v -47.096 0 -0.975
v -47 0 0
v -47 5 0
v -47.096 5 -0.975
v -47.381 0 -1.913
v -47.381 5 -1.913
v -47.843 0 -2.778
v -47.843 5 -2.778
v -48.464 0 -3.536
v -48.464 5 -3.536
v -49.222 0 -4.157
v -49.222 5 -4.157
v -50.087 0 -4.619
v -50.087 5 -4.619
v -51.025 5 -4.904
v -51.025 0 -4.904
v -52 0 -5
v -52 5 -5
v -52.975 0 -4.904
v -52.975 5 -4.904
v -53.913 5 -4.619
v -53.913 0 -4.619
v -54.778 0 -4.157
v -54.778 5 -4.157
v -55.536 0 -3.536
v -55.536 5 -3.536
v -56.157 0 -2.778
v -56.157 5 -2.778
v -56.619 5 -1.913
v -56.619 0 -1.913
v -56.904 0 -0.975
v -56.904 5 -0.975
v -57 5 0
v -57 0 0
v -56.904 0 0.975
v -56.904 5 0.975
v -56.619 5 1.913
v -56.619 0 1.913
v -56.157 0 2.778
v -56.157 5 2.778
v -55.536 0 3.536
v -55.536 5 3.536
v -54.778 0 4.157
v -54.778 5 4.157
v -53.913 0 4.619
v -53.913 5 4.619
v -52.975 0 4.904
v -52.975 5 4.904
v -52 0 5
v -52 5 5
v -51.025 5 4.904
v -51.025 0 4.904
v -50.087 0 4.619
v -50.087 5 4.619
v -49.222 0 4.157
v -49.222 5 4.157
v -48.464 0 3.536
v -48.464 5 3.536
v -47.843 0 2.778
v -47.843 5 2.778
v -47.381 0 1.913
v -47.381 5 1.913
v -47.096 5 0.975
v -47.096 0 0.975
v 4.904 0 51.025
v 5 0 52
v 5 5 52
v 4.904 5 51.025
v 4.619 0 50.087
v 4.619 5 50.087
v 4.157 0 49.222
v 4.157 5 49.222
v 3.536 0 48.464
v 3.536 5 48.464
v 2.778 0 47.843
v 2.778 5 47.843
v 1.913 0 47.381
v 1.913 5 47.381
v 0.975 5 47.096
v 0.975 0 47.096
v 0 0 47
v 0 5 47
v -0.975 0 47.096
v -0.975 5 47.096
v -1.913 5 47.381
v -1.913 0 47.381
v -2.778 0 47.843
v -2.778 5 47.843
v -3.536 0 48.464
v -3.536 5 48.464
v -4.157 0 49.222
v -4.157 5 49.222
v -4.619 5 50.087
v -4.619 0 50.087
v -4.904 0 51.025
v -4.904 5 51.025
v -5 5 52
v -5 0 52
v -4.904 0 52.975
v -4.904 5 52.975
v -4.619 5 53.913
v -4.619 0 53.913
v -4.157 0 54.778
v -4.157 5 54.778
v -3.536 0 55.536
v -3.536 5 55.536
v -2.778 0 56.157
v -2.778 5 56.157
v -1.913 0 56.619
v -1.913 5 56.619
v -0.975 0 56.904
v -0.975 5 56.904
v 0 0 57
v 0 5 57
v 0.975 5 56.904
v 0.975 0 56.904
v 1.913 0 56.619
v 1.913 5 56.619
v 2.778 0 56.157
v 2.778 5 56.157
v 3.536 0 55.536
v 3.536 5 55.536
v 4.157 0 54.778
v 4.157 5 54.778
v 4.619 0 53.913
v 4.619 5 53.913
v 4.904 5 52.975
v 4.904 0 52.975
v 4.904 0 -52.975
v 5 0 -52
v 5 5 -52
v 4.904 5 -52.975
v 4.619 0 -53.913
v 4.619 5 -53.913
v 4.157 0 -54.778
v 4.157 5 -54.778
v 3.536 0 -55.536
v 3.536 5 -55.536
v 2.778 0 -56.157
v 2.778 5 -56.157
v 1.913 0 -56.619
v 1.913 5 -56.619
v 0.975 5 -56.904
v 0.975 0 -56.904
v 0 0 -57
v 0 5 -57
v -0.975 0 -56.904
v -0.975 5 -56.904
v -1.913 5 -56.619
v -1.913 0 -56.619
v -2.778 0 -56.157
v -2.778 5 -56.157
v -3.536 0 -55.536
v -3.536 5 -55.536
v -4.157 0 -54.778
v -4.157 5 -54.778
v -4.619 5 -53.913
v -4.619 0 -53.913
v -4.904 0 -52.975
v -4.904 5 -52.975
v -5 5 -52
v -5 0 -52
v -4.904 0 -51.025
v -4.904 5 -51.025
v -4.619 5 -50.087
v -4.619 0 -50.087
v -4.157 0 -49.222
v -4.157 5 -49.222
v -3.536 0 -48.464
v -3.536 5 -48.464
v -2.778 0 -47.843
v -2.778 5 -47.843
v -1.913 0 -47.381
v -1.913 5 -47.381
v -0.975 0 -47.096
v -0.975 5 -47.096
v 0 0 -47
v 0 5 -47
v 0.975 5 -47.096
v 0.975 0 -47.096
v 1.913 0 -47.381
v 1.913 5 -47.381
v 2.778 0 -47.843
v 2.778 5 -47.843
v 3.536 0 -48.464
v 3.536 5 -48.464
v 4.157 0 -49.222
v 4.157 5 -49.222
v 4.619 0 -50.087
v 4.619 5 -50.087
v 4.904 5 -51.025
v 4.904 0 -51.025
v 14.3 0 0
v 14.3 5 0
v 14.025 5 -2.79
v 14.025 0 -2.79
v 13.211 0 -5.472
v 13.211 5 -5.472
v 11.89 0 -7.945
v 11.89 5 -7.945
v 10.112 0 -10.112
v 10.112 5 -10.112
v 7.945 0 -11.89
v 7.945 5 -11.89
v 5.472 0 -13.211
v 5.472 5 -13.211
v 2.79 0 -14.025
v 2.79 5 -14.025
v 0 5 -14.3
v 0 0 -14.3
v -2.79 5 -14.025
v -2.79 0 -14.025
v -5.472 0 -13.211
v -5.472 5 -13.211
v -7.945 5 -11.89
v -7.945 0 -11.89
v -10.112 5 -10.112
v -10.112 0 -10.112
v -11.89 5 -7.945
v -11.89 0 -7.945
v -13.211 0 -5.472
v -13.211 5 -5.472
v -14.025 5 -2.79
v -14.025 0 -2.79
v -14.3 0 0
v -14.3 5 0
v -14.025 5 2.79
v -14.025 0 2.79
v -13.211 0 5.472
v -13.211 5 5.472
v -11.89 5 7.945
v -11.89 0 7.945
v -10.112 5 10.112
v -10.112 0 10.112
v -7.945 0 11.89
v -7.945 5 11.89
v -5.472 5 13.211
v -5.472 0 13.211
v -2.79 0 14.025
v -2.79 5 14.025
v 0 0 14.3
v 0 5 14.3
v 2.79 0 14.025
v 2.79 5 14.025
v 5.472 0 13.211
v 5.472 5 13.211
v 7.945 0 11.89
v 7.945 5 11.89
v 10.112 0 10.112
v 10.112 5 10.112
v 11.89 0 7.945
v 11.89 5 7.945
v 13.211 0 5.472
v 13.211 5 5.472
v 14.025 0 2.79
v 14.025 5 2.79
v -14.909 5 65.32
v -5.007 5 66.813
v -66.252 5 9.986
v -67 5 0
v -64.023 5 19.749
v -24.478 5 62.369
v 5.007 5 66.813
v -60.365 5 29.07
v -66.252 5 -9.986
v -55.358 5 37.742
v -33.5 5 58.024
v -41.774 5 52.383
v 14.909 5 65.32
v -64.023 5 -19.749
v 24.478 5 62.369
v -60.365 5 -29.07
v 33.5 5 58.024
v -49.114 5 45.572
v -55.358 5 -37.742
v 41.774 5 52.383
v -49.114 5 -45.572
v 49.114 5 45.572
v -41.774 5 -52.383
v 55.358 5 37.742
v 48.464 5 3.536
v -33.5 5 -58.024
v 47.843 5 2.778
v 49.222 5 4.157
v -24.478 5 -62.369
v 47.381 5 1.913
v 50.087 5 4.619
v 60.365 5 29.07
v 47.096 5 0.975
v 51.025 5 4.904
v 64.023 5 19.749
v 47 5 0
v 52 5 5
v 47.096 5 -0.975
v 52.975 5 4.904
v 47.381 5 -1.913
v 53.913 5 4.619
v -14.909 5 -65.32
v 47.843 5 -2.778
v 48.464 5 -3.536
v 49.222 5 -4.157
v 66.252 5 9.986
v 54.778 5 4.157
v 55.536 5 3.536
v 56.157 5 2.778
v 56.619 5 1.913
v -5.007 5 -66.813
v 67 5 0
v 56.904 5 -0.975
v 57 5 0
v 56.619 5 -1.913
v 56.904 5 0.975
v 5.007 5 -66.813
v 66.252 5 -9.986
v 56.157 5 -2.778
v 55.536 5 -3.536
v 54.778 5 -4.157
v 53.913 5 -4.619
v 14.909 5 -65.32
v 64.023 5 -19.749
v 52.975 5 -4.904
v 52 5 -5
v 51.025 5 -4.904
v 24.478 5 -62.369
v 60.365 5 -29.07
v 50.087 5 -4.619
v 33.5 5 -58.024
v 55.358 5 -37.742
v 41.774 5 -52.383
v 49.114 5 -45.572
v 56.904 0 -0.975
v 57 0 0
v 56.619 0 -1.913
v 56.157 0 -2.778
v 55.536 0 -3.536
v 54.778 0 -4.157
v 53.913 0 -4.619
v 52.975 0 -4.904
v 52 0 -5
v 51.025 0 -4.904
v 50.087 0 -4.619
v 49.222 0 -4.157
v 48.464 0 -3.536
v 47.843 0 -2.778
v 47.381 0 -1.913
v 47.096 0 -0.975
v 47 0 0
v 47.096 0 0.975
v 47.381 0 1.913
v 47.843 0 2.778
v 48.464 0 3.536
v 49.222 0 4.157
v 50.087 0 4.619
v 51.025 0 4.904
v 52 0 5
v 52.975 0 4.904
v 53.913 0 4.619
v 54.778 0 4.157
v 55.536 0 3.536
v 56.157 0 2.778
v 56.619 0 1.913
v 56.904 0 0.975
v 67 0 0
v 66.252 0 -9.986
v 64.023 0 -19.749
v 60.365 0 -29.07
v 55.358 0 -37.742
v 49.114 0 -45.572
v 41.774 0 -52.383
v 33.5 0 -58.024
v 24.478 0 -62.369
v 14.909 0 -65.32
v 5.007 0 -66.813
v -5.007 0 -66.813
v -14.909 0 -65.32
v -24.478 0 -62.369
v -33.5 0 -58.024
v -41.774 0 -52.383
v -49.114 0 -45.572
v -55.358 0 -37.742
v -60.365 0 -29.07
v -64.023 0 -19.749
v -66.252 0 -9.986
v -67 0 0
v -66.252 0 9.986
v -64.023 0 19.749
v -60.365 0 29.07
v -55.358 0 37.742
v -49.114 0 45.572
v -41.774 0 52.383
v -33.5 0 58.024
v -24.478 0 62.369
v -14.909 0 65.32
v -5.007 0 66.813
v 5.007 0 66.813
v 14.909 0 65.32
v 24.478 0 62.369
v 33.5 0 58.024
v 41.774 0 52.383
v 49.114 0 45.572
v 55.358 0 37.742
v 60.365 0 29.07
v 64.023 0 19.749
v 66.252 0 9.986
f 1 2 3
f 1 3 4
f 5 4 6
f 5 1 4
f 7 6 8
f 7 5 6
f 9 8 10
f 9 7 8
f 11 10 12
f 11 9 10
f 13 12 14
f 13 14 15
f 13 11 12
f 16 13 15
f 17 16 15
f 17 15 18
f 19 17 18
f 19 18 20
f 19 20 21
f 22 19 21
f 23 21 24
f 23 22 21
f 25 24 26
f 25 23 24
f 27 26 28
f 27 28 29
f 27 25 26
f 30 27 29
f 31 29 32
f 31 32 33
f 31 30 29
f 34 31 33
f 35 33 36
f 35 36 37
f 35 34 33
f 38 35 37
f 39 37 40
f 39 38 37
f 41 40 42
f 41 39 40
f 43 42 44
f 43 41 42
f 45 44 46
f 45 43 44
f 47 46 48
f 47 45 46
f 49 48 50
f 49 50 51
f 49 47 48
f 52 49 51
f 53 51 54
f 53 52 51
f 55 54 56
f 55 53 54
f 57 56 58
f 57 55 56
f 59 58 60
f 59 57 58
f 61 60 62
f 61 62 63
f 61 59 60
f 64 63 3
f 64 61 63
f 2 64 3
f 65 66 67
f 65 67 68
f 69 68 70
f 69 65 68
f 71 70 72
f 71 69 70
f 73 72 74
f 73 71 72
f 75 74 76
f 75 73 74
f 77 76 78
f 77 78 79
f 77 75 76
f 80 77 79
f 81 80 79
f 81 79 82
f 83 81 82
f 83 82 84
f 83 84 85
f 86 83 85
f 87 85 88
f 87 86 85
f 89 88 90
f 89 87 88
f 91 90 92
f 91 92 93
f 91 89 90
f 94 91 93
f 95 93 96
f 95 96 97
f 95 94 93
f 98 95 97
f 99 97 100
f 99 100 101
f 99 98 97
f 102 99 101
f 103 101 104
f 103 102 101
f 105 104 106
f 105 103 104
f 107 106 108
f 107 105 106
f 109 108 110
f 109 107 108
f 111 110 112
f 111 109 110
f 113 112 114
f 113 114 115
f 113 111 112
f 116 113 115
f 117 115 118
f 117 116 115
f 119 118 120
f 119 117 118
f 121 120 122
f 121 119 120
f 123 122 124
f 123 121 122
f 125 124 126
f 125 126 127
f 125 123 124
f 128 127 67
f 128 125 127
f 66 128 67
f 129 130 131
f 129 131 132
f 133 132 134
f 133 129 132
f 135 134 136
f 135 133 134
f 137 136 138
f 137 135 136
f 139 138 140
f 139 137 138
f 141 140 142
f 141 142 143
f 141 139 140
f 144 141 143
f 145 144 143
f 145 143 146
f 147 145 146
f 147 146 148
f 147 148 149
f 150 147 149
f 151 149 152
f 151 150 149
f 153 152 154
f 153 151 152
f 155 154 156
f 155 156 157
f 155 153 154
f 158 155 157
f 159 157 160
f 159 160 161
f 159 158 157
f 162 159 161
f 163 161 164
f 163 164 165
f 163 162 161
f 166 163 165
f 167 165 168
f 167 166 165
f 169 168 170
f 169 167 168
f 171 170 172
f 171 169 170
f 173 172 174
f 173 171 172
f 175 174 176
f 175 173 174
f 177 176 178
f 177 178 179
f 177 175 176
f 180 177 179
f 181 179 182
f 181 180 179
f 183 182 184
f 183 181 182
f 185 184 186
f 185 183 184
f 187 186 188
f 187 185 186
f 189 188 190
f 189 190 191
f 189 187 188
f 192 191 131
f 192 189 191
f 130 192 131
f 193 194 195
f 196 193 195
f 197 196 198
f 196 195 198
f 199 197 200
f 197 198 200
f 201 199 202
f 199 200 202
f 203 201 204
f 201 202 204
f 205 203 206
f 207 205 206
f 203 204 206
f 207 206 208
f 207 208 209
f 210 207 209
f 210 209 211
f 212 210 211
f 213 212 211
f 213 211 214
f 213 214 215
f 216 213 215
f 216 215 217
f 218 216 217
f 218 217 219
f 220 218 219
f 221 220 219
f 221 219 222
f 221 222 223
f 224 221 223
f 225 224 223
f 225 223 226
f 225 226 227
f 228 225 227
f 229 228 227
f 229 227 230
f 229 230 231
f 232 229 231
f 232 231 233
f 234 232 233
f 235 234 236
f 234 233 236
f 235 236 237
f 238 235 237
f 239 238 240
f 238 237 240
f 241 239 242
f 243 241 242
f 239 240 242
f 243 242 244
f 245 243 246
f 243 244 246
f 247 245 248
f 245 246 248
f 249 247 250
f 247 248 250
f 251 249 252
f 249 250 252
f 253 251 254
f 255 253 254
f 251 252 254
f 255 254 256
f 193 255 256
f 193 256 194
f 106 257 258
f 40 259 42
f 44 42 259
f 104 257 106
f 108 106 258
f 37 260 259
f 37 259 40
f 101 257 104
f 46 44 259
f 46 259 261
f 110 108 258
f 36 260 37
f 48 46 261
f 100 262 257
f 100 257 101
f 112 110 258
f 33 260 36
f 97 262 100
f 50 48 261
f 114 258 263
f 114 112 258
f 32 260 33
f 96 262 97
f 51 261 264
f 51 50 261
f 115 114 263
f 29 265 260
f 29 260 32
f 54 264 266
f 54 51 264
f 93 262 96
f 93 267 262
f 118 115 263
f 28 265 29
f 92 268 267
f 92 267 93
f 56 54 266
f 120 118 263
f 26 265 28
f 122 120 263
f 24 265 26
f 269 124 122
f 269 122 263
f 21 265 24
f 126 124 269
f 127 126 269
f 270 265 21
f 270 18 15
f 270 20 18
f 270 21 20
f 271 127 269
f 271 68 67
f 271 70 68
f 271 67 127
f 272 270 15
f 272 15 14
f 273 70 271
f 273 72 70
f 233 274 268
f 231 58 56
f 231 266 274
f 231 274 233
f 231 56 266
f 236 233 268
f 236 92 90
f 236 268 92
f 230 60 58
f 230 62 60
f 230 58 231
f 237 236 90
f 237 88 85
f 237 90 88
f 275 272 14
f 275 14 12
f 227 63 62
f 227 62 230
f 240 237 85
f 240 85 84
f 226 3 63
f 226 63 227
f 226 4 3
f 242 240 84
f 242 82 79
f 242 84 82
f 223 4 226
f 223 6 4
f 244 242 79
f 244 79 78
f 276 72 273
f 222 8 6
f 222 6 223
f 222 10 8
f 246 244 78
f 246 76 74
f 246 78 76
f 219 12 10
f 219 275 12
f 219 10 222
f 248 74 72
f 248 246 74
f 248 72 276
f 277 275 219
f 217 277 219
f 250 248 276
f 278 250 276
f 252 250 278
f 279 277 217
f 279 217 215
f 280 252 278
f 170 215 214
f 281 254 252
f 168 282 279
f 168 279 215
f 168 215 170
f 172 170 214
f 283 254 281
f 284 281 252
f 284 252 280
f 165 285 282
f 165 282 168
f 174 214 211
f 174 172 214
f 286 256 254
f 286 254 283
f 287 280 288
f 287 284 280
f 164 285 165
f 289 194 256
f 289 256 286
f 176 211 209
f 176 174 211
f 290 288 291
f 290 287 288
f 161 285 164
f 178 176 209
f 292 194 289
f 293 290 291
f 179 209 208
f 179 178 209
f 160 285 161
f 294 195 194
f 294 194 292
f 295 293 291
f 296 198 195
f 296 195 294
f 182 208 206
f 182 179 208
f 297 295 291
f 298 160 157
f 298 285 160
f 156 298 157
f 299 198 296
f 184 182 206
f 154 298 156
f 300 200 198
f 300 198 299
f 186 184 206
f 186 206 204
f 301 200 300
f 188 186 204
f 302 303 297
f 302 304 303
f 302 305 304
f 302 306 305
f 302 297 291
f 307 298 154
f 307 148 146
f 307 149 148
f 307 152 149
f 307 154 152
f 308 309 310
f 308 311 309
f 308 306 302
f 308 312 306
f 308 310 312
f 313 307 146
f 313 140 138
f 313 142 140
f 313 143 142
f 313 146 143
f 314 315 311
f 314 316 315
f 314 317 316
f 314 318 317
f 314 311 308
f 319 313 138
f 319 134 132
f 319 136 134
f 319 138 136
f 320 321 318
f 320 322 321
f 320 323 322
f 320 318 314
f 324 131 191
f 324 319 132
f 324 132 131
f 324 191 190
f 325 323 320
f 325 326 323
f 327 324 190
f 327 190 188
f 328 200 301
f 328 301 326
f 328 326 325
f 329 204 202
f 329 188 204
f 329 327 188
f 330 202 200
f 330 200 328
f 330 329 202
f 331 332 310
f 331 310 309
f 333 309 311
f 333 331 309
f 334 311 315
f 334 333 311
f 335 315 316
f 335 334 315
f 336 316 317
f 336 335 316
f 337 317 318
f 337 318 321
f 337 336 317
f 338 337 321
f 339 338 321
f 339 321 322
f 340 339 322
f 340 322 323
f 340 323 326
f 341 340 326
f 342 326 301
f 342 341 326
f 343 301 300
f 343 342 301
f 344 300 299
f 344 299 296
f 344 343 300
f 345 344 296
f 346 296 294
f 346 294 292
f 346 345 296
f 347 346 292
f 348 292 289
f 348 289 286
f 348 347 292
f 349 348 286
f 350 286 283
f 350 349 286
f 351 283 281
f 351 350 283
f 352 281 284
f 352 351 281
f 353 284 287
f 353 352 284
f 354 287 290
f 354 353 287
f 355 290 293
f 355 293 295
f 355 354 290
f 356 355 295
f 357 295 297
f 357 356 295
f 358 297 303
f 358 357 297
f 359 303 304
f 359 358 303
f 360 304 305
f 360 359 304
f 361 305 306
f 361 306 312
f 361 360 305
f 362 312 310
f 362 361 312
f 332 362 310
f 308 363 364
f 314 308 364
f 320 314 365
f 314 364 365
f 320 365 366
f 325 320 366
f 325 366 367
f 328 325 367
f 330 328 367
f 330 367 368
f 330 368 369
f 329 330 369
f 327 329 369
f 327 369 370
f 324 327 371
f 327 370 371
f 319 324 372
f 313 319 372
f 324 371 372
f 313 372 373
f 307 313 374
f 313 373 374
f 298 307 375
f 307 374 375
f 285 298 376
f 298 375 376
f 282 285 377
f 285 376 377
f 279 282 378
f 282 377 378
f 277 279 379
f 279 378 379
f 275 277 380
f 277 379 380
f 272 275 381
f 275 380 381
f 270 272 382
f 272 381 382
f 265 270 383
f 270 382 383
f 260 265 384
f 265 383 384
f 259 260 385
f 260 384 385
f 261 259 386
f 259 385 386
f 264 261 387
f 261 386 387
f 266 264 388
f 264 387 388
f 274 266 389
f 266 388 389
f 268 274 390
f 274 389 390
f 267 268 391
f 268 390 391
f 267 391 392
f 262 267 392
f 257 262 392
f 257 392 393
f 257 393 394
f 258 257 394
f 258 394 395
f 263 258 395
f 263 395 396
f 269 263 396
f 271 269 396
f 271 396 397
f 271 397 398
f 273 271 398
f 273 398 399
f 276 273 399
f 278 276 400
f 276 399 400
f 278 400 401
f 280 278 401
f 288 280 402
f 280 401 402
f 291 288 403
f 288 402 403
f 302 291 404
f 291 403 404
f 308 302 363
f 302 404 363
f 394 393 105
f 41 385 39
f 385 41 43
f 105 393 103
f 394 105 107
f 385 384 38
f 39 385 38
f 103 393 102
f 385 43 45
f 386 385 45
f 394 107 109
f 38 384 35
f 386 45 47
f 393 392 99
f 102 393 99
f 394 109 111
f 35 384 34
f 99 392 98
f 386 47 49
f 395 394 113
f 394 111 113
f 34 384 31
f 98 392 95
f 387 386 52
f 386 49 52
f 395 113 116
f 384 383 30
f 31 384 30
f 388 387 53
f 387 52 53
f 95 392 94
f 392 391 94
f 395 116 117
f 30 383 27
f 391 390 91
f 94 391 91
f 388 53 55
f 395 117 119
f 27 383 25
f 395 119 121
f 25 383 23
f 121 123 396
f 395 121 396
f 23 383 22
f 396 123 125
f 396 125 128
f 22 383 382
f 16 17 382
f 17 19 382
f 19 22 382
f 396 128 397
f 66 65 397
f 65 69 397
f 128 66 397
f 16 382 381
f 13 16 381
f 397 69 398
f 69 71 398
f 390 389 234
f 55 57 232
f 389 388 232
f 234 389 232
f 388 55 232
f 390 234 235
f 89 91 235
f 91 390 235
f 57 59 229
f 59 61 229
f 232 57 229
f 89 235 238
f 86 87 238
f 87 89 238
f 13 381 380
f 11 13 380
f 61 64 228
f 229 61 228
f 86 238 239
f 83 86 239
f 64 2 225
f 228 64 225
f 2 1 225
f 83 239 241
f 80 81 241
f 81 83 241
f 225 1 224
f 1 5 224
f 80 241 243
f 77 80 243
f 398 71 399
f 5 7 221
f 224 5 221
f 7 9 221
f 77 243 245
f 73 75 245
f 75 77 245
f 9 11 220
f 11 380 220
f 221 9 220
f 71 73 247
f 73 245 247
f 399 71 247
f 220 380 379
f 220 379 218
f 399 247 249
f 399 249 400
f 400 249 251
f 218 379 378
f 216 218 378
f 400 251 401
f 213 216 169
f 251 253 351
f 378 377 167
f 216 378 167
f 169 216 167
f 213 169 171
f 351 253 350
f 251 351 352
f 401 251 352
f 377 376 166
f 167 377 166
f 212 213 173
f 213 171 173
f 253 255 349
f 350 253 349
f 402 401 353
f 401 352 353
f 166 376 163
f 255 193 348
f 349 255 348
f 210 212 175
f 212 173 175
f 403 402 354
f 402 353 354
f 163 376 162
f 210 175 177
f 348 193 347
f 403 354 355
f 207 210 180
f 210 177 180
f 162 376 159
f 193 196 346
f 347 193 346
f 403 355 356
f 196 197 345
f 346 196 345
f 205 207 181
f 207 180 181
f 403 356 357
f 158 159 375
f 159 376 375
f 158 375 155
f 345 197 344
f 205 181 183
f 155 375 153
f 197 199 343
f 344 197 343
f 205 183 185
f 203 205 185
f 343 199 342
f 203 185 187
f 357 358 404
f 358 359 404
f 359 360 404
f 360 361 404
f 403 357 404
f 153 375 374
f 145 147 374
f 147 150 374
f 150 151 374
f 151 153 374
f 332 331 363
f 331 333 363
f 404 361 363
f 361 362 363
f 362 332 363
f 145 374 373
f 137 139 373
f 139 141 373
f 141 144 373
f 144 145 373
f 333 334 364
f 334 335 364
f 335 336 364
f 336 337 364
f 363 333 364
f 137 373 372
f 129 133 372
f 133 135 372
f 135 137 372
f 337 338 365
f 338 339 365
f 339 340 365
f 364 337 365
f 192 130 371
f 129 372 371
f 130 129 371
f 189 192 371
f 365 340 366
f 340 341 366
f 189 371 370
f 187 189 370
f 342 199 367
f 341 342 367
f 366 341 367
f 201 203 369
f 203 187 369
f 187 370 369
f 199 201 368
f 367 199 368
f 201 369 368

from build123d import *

# Parameters (mm, degrees)
SKETCH1_R               = 67
SKETCH1_R_2             = 5
BOSS_EXTRUDE1_DEPTH     = 5
SKETCH2_4_R             = 14.3
CUT_EXTRUDE3_DEPTH      = 1
CUT_EXTRUDE3_DEPTH_BACK = 6


with BuildPart() as part:
    # Sketch1 → Boss-Extrude1 (new body)
    with BuildSketch(Plane(origin=(0, 0, 0), x_dir=(1, 0, 0), z_dir=(0, 1, 0))):
        Circle(SKETCH1_R)
        with Locations((0, 52)):
            Circle(SKETCH1_R_2, mode=Mode.SUBTRACT)
        with Locations((52, 0)):
            Circle(SKETCH1_R_2, mode=Mode.SUBTRACT)
        with Locations((0, -52)):
            Circle(SKETCH1_R_2, mode=Mode.SUBTRACT)
        with Locations((-52, 0)):
            Circle(SKETCH1_R_2, mode=Mode.SUBTRACT)
    extrude(amount=BOSS_EXTRUDE1_DEPTH)

    # Sketch2<4> → Cut-Extrude3 (cut, two sides)
    with BuildSketch(Plane(origin=(0, 5, 0), x_dir=(1, 0, 0), z_dir=(0, 1, 0))) as cut_extrude3_sk:
        Circle(SKETCH2_4_R)
    extrude(amount=CUT_EXTRUDE3_DEPTH, mode=Mode.SUBTRACT)
    extrude(cut_extrude3_sk.sketch, amount=-CUT_EXTRUDE3_DEPTH_BACK, mode=Mode.SUBTRACT)


solid = part.part
